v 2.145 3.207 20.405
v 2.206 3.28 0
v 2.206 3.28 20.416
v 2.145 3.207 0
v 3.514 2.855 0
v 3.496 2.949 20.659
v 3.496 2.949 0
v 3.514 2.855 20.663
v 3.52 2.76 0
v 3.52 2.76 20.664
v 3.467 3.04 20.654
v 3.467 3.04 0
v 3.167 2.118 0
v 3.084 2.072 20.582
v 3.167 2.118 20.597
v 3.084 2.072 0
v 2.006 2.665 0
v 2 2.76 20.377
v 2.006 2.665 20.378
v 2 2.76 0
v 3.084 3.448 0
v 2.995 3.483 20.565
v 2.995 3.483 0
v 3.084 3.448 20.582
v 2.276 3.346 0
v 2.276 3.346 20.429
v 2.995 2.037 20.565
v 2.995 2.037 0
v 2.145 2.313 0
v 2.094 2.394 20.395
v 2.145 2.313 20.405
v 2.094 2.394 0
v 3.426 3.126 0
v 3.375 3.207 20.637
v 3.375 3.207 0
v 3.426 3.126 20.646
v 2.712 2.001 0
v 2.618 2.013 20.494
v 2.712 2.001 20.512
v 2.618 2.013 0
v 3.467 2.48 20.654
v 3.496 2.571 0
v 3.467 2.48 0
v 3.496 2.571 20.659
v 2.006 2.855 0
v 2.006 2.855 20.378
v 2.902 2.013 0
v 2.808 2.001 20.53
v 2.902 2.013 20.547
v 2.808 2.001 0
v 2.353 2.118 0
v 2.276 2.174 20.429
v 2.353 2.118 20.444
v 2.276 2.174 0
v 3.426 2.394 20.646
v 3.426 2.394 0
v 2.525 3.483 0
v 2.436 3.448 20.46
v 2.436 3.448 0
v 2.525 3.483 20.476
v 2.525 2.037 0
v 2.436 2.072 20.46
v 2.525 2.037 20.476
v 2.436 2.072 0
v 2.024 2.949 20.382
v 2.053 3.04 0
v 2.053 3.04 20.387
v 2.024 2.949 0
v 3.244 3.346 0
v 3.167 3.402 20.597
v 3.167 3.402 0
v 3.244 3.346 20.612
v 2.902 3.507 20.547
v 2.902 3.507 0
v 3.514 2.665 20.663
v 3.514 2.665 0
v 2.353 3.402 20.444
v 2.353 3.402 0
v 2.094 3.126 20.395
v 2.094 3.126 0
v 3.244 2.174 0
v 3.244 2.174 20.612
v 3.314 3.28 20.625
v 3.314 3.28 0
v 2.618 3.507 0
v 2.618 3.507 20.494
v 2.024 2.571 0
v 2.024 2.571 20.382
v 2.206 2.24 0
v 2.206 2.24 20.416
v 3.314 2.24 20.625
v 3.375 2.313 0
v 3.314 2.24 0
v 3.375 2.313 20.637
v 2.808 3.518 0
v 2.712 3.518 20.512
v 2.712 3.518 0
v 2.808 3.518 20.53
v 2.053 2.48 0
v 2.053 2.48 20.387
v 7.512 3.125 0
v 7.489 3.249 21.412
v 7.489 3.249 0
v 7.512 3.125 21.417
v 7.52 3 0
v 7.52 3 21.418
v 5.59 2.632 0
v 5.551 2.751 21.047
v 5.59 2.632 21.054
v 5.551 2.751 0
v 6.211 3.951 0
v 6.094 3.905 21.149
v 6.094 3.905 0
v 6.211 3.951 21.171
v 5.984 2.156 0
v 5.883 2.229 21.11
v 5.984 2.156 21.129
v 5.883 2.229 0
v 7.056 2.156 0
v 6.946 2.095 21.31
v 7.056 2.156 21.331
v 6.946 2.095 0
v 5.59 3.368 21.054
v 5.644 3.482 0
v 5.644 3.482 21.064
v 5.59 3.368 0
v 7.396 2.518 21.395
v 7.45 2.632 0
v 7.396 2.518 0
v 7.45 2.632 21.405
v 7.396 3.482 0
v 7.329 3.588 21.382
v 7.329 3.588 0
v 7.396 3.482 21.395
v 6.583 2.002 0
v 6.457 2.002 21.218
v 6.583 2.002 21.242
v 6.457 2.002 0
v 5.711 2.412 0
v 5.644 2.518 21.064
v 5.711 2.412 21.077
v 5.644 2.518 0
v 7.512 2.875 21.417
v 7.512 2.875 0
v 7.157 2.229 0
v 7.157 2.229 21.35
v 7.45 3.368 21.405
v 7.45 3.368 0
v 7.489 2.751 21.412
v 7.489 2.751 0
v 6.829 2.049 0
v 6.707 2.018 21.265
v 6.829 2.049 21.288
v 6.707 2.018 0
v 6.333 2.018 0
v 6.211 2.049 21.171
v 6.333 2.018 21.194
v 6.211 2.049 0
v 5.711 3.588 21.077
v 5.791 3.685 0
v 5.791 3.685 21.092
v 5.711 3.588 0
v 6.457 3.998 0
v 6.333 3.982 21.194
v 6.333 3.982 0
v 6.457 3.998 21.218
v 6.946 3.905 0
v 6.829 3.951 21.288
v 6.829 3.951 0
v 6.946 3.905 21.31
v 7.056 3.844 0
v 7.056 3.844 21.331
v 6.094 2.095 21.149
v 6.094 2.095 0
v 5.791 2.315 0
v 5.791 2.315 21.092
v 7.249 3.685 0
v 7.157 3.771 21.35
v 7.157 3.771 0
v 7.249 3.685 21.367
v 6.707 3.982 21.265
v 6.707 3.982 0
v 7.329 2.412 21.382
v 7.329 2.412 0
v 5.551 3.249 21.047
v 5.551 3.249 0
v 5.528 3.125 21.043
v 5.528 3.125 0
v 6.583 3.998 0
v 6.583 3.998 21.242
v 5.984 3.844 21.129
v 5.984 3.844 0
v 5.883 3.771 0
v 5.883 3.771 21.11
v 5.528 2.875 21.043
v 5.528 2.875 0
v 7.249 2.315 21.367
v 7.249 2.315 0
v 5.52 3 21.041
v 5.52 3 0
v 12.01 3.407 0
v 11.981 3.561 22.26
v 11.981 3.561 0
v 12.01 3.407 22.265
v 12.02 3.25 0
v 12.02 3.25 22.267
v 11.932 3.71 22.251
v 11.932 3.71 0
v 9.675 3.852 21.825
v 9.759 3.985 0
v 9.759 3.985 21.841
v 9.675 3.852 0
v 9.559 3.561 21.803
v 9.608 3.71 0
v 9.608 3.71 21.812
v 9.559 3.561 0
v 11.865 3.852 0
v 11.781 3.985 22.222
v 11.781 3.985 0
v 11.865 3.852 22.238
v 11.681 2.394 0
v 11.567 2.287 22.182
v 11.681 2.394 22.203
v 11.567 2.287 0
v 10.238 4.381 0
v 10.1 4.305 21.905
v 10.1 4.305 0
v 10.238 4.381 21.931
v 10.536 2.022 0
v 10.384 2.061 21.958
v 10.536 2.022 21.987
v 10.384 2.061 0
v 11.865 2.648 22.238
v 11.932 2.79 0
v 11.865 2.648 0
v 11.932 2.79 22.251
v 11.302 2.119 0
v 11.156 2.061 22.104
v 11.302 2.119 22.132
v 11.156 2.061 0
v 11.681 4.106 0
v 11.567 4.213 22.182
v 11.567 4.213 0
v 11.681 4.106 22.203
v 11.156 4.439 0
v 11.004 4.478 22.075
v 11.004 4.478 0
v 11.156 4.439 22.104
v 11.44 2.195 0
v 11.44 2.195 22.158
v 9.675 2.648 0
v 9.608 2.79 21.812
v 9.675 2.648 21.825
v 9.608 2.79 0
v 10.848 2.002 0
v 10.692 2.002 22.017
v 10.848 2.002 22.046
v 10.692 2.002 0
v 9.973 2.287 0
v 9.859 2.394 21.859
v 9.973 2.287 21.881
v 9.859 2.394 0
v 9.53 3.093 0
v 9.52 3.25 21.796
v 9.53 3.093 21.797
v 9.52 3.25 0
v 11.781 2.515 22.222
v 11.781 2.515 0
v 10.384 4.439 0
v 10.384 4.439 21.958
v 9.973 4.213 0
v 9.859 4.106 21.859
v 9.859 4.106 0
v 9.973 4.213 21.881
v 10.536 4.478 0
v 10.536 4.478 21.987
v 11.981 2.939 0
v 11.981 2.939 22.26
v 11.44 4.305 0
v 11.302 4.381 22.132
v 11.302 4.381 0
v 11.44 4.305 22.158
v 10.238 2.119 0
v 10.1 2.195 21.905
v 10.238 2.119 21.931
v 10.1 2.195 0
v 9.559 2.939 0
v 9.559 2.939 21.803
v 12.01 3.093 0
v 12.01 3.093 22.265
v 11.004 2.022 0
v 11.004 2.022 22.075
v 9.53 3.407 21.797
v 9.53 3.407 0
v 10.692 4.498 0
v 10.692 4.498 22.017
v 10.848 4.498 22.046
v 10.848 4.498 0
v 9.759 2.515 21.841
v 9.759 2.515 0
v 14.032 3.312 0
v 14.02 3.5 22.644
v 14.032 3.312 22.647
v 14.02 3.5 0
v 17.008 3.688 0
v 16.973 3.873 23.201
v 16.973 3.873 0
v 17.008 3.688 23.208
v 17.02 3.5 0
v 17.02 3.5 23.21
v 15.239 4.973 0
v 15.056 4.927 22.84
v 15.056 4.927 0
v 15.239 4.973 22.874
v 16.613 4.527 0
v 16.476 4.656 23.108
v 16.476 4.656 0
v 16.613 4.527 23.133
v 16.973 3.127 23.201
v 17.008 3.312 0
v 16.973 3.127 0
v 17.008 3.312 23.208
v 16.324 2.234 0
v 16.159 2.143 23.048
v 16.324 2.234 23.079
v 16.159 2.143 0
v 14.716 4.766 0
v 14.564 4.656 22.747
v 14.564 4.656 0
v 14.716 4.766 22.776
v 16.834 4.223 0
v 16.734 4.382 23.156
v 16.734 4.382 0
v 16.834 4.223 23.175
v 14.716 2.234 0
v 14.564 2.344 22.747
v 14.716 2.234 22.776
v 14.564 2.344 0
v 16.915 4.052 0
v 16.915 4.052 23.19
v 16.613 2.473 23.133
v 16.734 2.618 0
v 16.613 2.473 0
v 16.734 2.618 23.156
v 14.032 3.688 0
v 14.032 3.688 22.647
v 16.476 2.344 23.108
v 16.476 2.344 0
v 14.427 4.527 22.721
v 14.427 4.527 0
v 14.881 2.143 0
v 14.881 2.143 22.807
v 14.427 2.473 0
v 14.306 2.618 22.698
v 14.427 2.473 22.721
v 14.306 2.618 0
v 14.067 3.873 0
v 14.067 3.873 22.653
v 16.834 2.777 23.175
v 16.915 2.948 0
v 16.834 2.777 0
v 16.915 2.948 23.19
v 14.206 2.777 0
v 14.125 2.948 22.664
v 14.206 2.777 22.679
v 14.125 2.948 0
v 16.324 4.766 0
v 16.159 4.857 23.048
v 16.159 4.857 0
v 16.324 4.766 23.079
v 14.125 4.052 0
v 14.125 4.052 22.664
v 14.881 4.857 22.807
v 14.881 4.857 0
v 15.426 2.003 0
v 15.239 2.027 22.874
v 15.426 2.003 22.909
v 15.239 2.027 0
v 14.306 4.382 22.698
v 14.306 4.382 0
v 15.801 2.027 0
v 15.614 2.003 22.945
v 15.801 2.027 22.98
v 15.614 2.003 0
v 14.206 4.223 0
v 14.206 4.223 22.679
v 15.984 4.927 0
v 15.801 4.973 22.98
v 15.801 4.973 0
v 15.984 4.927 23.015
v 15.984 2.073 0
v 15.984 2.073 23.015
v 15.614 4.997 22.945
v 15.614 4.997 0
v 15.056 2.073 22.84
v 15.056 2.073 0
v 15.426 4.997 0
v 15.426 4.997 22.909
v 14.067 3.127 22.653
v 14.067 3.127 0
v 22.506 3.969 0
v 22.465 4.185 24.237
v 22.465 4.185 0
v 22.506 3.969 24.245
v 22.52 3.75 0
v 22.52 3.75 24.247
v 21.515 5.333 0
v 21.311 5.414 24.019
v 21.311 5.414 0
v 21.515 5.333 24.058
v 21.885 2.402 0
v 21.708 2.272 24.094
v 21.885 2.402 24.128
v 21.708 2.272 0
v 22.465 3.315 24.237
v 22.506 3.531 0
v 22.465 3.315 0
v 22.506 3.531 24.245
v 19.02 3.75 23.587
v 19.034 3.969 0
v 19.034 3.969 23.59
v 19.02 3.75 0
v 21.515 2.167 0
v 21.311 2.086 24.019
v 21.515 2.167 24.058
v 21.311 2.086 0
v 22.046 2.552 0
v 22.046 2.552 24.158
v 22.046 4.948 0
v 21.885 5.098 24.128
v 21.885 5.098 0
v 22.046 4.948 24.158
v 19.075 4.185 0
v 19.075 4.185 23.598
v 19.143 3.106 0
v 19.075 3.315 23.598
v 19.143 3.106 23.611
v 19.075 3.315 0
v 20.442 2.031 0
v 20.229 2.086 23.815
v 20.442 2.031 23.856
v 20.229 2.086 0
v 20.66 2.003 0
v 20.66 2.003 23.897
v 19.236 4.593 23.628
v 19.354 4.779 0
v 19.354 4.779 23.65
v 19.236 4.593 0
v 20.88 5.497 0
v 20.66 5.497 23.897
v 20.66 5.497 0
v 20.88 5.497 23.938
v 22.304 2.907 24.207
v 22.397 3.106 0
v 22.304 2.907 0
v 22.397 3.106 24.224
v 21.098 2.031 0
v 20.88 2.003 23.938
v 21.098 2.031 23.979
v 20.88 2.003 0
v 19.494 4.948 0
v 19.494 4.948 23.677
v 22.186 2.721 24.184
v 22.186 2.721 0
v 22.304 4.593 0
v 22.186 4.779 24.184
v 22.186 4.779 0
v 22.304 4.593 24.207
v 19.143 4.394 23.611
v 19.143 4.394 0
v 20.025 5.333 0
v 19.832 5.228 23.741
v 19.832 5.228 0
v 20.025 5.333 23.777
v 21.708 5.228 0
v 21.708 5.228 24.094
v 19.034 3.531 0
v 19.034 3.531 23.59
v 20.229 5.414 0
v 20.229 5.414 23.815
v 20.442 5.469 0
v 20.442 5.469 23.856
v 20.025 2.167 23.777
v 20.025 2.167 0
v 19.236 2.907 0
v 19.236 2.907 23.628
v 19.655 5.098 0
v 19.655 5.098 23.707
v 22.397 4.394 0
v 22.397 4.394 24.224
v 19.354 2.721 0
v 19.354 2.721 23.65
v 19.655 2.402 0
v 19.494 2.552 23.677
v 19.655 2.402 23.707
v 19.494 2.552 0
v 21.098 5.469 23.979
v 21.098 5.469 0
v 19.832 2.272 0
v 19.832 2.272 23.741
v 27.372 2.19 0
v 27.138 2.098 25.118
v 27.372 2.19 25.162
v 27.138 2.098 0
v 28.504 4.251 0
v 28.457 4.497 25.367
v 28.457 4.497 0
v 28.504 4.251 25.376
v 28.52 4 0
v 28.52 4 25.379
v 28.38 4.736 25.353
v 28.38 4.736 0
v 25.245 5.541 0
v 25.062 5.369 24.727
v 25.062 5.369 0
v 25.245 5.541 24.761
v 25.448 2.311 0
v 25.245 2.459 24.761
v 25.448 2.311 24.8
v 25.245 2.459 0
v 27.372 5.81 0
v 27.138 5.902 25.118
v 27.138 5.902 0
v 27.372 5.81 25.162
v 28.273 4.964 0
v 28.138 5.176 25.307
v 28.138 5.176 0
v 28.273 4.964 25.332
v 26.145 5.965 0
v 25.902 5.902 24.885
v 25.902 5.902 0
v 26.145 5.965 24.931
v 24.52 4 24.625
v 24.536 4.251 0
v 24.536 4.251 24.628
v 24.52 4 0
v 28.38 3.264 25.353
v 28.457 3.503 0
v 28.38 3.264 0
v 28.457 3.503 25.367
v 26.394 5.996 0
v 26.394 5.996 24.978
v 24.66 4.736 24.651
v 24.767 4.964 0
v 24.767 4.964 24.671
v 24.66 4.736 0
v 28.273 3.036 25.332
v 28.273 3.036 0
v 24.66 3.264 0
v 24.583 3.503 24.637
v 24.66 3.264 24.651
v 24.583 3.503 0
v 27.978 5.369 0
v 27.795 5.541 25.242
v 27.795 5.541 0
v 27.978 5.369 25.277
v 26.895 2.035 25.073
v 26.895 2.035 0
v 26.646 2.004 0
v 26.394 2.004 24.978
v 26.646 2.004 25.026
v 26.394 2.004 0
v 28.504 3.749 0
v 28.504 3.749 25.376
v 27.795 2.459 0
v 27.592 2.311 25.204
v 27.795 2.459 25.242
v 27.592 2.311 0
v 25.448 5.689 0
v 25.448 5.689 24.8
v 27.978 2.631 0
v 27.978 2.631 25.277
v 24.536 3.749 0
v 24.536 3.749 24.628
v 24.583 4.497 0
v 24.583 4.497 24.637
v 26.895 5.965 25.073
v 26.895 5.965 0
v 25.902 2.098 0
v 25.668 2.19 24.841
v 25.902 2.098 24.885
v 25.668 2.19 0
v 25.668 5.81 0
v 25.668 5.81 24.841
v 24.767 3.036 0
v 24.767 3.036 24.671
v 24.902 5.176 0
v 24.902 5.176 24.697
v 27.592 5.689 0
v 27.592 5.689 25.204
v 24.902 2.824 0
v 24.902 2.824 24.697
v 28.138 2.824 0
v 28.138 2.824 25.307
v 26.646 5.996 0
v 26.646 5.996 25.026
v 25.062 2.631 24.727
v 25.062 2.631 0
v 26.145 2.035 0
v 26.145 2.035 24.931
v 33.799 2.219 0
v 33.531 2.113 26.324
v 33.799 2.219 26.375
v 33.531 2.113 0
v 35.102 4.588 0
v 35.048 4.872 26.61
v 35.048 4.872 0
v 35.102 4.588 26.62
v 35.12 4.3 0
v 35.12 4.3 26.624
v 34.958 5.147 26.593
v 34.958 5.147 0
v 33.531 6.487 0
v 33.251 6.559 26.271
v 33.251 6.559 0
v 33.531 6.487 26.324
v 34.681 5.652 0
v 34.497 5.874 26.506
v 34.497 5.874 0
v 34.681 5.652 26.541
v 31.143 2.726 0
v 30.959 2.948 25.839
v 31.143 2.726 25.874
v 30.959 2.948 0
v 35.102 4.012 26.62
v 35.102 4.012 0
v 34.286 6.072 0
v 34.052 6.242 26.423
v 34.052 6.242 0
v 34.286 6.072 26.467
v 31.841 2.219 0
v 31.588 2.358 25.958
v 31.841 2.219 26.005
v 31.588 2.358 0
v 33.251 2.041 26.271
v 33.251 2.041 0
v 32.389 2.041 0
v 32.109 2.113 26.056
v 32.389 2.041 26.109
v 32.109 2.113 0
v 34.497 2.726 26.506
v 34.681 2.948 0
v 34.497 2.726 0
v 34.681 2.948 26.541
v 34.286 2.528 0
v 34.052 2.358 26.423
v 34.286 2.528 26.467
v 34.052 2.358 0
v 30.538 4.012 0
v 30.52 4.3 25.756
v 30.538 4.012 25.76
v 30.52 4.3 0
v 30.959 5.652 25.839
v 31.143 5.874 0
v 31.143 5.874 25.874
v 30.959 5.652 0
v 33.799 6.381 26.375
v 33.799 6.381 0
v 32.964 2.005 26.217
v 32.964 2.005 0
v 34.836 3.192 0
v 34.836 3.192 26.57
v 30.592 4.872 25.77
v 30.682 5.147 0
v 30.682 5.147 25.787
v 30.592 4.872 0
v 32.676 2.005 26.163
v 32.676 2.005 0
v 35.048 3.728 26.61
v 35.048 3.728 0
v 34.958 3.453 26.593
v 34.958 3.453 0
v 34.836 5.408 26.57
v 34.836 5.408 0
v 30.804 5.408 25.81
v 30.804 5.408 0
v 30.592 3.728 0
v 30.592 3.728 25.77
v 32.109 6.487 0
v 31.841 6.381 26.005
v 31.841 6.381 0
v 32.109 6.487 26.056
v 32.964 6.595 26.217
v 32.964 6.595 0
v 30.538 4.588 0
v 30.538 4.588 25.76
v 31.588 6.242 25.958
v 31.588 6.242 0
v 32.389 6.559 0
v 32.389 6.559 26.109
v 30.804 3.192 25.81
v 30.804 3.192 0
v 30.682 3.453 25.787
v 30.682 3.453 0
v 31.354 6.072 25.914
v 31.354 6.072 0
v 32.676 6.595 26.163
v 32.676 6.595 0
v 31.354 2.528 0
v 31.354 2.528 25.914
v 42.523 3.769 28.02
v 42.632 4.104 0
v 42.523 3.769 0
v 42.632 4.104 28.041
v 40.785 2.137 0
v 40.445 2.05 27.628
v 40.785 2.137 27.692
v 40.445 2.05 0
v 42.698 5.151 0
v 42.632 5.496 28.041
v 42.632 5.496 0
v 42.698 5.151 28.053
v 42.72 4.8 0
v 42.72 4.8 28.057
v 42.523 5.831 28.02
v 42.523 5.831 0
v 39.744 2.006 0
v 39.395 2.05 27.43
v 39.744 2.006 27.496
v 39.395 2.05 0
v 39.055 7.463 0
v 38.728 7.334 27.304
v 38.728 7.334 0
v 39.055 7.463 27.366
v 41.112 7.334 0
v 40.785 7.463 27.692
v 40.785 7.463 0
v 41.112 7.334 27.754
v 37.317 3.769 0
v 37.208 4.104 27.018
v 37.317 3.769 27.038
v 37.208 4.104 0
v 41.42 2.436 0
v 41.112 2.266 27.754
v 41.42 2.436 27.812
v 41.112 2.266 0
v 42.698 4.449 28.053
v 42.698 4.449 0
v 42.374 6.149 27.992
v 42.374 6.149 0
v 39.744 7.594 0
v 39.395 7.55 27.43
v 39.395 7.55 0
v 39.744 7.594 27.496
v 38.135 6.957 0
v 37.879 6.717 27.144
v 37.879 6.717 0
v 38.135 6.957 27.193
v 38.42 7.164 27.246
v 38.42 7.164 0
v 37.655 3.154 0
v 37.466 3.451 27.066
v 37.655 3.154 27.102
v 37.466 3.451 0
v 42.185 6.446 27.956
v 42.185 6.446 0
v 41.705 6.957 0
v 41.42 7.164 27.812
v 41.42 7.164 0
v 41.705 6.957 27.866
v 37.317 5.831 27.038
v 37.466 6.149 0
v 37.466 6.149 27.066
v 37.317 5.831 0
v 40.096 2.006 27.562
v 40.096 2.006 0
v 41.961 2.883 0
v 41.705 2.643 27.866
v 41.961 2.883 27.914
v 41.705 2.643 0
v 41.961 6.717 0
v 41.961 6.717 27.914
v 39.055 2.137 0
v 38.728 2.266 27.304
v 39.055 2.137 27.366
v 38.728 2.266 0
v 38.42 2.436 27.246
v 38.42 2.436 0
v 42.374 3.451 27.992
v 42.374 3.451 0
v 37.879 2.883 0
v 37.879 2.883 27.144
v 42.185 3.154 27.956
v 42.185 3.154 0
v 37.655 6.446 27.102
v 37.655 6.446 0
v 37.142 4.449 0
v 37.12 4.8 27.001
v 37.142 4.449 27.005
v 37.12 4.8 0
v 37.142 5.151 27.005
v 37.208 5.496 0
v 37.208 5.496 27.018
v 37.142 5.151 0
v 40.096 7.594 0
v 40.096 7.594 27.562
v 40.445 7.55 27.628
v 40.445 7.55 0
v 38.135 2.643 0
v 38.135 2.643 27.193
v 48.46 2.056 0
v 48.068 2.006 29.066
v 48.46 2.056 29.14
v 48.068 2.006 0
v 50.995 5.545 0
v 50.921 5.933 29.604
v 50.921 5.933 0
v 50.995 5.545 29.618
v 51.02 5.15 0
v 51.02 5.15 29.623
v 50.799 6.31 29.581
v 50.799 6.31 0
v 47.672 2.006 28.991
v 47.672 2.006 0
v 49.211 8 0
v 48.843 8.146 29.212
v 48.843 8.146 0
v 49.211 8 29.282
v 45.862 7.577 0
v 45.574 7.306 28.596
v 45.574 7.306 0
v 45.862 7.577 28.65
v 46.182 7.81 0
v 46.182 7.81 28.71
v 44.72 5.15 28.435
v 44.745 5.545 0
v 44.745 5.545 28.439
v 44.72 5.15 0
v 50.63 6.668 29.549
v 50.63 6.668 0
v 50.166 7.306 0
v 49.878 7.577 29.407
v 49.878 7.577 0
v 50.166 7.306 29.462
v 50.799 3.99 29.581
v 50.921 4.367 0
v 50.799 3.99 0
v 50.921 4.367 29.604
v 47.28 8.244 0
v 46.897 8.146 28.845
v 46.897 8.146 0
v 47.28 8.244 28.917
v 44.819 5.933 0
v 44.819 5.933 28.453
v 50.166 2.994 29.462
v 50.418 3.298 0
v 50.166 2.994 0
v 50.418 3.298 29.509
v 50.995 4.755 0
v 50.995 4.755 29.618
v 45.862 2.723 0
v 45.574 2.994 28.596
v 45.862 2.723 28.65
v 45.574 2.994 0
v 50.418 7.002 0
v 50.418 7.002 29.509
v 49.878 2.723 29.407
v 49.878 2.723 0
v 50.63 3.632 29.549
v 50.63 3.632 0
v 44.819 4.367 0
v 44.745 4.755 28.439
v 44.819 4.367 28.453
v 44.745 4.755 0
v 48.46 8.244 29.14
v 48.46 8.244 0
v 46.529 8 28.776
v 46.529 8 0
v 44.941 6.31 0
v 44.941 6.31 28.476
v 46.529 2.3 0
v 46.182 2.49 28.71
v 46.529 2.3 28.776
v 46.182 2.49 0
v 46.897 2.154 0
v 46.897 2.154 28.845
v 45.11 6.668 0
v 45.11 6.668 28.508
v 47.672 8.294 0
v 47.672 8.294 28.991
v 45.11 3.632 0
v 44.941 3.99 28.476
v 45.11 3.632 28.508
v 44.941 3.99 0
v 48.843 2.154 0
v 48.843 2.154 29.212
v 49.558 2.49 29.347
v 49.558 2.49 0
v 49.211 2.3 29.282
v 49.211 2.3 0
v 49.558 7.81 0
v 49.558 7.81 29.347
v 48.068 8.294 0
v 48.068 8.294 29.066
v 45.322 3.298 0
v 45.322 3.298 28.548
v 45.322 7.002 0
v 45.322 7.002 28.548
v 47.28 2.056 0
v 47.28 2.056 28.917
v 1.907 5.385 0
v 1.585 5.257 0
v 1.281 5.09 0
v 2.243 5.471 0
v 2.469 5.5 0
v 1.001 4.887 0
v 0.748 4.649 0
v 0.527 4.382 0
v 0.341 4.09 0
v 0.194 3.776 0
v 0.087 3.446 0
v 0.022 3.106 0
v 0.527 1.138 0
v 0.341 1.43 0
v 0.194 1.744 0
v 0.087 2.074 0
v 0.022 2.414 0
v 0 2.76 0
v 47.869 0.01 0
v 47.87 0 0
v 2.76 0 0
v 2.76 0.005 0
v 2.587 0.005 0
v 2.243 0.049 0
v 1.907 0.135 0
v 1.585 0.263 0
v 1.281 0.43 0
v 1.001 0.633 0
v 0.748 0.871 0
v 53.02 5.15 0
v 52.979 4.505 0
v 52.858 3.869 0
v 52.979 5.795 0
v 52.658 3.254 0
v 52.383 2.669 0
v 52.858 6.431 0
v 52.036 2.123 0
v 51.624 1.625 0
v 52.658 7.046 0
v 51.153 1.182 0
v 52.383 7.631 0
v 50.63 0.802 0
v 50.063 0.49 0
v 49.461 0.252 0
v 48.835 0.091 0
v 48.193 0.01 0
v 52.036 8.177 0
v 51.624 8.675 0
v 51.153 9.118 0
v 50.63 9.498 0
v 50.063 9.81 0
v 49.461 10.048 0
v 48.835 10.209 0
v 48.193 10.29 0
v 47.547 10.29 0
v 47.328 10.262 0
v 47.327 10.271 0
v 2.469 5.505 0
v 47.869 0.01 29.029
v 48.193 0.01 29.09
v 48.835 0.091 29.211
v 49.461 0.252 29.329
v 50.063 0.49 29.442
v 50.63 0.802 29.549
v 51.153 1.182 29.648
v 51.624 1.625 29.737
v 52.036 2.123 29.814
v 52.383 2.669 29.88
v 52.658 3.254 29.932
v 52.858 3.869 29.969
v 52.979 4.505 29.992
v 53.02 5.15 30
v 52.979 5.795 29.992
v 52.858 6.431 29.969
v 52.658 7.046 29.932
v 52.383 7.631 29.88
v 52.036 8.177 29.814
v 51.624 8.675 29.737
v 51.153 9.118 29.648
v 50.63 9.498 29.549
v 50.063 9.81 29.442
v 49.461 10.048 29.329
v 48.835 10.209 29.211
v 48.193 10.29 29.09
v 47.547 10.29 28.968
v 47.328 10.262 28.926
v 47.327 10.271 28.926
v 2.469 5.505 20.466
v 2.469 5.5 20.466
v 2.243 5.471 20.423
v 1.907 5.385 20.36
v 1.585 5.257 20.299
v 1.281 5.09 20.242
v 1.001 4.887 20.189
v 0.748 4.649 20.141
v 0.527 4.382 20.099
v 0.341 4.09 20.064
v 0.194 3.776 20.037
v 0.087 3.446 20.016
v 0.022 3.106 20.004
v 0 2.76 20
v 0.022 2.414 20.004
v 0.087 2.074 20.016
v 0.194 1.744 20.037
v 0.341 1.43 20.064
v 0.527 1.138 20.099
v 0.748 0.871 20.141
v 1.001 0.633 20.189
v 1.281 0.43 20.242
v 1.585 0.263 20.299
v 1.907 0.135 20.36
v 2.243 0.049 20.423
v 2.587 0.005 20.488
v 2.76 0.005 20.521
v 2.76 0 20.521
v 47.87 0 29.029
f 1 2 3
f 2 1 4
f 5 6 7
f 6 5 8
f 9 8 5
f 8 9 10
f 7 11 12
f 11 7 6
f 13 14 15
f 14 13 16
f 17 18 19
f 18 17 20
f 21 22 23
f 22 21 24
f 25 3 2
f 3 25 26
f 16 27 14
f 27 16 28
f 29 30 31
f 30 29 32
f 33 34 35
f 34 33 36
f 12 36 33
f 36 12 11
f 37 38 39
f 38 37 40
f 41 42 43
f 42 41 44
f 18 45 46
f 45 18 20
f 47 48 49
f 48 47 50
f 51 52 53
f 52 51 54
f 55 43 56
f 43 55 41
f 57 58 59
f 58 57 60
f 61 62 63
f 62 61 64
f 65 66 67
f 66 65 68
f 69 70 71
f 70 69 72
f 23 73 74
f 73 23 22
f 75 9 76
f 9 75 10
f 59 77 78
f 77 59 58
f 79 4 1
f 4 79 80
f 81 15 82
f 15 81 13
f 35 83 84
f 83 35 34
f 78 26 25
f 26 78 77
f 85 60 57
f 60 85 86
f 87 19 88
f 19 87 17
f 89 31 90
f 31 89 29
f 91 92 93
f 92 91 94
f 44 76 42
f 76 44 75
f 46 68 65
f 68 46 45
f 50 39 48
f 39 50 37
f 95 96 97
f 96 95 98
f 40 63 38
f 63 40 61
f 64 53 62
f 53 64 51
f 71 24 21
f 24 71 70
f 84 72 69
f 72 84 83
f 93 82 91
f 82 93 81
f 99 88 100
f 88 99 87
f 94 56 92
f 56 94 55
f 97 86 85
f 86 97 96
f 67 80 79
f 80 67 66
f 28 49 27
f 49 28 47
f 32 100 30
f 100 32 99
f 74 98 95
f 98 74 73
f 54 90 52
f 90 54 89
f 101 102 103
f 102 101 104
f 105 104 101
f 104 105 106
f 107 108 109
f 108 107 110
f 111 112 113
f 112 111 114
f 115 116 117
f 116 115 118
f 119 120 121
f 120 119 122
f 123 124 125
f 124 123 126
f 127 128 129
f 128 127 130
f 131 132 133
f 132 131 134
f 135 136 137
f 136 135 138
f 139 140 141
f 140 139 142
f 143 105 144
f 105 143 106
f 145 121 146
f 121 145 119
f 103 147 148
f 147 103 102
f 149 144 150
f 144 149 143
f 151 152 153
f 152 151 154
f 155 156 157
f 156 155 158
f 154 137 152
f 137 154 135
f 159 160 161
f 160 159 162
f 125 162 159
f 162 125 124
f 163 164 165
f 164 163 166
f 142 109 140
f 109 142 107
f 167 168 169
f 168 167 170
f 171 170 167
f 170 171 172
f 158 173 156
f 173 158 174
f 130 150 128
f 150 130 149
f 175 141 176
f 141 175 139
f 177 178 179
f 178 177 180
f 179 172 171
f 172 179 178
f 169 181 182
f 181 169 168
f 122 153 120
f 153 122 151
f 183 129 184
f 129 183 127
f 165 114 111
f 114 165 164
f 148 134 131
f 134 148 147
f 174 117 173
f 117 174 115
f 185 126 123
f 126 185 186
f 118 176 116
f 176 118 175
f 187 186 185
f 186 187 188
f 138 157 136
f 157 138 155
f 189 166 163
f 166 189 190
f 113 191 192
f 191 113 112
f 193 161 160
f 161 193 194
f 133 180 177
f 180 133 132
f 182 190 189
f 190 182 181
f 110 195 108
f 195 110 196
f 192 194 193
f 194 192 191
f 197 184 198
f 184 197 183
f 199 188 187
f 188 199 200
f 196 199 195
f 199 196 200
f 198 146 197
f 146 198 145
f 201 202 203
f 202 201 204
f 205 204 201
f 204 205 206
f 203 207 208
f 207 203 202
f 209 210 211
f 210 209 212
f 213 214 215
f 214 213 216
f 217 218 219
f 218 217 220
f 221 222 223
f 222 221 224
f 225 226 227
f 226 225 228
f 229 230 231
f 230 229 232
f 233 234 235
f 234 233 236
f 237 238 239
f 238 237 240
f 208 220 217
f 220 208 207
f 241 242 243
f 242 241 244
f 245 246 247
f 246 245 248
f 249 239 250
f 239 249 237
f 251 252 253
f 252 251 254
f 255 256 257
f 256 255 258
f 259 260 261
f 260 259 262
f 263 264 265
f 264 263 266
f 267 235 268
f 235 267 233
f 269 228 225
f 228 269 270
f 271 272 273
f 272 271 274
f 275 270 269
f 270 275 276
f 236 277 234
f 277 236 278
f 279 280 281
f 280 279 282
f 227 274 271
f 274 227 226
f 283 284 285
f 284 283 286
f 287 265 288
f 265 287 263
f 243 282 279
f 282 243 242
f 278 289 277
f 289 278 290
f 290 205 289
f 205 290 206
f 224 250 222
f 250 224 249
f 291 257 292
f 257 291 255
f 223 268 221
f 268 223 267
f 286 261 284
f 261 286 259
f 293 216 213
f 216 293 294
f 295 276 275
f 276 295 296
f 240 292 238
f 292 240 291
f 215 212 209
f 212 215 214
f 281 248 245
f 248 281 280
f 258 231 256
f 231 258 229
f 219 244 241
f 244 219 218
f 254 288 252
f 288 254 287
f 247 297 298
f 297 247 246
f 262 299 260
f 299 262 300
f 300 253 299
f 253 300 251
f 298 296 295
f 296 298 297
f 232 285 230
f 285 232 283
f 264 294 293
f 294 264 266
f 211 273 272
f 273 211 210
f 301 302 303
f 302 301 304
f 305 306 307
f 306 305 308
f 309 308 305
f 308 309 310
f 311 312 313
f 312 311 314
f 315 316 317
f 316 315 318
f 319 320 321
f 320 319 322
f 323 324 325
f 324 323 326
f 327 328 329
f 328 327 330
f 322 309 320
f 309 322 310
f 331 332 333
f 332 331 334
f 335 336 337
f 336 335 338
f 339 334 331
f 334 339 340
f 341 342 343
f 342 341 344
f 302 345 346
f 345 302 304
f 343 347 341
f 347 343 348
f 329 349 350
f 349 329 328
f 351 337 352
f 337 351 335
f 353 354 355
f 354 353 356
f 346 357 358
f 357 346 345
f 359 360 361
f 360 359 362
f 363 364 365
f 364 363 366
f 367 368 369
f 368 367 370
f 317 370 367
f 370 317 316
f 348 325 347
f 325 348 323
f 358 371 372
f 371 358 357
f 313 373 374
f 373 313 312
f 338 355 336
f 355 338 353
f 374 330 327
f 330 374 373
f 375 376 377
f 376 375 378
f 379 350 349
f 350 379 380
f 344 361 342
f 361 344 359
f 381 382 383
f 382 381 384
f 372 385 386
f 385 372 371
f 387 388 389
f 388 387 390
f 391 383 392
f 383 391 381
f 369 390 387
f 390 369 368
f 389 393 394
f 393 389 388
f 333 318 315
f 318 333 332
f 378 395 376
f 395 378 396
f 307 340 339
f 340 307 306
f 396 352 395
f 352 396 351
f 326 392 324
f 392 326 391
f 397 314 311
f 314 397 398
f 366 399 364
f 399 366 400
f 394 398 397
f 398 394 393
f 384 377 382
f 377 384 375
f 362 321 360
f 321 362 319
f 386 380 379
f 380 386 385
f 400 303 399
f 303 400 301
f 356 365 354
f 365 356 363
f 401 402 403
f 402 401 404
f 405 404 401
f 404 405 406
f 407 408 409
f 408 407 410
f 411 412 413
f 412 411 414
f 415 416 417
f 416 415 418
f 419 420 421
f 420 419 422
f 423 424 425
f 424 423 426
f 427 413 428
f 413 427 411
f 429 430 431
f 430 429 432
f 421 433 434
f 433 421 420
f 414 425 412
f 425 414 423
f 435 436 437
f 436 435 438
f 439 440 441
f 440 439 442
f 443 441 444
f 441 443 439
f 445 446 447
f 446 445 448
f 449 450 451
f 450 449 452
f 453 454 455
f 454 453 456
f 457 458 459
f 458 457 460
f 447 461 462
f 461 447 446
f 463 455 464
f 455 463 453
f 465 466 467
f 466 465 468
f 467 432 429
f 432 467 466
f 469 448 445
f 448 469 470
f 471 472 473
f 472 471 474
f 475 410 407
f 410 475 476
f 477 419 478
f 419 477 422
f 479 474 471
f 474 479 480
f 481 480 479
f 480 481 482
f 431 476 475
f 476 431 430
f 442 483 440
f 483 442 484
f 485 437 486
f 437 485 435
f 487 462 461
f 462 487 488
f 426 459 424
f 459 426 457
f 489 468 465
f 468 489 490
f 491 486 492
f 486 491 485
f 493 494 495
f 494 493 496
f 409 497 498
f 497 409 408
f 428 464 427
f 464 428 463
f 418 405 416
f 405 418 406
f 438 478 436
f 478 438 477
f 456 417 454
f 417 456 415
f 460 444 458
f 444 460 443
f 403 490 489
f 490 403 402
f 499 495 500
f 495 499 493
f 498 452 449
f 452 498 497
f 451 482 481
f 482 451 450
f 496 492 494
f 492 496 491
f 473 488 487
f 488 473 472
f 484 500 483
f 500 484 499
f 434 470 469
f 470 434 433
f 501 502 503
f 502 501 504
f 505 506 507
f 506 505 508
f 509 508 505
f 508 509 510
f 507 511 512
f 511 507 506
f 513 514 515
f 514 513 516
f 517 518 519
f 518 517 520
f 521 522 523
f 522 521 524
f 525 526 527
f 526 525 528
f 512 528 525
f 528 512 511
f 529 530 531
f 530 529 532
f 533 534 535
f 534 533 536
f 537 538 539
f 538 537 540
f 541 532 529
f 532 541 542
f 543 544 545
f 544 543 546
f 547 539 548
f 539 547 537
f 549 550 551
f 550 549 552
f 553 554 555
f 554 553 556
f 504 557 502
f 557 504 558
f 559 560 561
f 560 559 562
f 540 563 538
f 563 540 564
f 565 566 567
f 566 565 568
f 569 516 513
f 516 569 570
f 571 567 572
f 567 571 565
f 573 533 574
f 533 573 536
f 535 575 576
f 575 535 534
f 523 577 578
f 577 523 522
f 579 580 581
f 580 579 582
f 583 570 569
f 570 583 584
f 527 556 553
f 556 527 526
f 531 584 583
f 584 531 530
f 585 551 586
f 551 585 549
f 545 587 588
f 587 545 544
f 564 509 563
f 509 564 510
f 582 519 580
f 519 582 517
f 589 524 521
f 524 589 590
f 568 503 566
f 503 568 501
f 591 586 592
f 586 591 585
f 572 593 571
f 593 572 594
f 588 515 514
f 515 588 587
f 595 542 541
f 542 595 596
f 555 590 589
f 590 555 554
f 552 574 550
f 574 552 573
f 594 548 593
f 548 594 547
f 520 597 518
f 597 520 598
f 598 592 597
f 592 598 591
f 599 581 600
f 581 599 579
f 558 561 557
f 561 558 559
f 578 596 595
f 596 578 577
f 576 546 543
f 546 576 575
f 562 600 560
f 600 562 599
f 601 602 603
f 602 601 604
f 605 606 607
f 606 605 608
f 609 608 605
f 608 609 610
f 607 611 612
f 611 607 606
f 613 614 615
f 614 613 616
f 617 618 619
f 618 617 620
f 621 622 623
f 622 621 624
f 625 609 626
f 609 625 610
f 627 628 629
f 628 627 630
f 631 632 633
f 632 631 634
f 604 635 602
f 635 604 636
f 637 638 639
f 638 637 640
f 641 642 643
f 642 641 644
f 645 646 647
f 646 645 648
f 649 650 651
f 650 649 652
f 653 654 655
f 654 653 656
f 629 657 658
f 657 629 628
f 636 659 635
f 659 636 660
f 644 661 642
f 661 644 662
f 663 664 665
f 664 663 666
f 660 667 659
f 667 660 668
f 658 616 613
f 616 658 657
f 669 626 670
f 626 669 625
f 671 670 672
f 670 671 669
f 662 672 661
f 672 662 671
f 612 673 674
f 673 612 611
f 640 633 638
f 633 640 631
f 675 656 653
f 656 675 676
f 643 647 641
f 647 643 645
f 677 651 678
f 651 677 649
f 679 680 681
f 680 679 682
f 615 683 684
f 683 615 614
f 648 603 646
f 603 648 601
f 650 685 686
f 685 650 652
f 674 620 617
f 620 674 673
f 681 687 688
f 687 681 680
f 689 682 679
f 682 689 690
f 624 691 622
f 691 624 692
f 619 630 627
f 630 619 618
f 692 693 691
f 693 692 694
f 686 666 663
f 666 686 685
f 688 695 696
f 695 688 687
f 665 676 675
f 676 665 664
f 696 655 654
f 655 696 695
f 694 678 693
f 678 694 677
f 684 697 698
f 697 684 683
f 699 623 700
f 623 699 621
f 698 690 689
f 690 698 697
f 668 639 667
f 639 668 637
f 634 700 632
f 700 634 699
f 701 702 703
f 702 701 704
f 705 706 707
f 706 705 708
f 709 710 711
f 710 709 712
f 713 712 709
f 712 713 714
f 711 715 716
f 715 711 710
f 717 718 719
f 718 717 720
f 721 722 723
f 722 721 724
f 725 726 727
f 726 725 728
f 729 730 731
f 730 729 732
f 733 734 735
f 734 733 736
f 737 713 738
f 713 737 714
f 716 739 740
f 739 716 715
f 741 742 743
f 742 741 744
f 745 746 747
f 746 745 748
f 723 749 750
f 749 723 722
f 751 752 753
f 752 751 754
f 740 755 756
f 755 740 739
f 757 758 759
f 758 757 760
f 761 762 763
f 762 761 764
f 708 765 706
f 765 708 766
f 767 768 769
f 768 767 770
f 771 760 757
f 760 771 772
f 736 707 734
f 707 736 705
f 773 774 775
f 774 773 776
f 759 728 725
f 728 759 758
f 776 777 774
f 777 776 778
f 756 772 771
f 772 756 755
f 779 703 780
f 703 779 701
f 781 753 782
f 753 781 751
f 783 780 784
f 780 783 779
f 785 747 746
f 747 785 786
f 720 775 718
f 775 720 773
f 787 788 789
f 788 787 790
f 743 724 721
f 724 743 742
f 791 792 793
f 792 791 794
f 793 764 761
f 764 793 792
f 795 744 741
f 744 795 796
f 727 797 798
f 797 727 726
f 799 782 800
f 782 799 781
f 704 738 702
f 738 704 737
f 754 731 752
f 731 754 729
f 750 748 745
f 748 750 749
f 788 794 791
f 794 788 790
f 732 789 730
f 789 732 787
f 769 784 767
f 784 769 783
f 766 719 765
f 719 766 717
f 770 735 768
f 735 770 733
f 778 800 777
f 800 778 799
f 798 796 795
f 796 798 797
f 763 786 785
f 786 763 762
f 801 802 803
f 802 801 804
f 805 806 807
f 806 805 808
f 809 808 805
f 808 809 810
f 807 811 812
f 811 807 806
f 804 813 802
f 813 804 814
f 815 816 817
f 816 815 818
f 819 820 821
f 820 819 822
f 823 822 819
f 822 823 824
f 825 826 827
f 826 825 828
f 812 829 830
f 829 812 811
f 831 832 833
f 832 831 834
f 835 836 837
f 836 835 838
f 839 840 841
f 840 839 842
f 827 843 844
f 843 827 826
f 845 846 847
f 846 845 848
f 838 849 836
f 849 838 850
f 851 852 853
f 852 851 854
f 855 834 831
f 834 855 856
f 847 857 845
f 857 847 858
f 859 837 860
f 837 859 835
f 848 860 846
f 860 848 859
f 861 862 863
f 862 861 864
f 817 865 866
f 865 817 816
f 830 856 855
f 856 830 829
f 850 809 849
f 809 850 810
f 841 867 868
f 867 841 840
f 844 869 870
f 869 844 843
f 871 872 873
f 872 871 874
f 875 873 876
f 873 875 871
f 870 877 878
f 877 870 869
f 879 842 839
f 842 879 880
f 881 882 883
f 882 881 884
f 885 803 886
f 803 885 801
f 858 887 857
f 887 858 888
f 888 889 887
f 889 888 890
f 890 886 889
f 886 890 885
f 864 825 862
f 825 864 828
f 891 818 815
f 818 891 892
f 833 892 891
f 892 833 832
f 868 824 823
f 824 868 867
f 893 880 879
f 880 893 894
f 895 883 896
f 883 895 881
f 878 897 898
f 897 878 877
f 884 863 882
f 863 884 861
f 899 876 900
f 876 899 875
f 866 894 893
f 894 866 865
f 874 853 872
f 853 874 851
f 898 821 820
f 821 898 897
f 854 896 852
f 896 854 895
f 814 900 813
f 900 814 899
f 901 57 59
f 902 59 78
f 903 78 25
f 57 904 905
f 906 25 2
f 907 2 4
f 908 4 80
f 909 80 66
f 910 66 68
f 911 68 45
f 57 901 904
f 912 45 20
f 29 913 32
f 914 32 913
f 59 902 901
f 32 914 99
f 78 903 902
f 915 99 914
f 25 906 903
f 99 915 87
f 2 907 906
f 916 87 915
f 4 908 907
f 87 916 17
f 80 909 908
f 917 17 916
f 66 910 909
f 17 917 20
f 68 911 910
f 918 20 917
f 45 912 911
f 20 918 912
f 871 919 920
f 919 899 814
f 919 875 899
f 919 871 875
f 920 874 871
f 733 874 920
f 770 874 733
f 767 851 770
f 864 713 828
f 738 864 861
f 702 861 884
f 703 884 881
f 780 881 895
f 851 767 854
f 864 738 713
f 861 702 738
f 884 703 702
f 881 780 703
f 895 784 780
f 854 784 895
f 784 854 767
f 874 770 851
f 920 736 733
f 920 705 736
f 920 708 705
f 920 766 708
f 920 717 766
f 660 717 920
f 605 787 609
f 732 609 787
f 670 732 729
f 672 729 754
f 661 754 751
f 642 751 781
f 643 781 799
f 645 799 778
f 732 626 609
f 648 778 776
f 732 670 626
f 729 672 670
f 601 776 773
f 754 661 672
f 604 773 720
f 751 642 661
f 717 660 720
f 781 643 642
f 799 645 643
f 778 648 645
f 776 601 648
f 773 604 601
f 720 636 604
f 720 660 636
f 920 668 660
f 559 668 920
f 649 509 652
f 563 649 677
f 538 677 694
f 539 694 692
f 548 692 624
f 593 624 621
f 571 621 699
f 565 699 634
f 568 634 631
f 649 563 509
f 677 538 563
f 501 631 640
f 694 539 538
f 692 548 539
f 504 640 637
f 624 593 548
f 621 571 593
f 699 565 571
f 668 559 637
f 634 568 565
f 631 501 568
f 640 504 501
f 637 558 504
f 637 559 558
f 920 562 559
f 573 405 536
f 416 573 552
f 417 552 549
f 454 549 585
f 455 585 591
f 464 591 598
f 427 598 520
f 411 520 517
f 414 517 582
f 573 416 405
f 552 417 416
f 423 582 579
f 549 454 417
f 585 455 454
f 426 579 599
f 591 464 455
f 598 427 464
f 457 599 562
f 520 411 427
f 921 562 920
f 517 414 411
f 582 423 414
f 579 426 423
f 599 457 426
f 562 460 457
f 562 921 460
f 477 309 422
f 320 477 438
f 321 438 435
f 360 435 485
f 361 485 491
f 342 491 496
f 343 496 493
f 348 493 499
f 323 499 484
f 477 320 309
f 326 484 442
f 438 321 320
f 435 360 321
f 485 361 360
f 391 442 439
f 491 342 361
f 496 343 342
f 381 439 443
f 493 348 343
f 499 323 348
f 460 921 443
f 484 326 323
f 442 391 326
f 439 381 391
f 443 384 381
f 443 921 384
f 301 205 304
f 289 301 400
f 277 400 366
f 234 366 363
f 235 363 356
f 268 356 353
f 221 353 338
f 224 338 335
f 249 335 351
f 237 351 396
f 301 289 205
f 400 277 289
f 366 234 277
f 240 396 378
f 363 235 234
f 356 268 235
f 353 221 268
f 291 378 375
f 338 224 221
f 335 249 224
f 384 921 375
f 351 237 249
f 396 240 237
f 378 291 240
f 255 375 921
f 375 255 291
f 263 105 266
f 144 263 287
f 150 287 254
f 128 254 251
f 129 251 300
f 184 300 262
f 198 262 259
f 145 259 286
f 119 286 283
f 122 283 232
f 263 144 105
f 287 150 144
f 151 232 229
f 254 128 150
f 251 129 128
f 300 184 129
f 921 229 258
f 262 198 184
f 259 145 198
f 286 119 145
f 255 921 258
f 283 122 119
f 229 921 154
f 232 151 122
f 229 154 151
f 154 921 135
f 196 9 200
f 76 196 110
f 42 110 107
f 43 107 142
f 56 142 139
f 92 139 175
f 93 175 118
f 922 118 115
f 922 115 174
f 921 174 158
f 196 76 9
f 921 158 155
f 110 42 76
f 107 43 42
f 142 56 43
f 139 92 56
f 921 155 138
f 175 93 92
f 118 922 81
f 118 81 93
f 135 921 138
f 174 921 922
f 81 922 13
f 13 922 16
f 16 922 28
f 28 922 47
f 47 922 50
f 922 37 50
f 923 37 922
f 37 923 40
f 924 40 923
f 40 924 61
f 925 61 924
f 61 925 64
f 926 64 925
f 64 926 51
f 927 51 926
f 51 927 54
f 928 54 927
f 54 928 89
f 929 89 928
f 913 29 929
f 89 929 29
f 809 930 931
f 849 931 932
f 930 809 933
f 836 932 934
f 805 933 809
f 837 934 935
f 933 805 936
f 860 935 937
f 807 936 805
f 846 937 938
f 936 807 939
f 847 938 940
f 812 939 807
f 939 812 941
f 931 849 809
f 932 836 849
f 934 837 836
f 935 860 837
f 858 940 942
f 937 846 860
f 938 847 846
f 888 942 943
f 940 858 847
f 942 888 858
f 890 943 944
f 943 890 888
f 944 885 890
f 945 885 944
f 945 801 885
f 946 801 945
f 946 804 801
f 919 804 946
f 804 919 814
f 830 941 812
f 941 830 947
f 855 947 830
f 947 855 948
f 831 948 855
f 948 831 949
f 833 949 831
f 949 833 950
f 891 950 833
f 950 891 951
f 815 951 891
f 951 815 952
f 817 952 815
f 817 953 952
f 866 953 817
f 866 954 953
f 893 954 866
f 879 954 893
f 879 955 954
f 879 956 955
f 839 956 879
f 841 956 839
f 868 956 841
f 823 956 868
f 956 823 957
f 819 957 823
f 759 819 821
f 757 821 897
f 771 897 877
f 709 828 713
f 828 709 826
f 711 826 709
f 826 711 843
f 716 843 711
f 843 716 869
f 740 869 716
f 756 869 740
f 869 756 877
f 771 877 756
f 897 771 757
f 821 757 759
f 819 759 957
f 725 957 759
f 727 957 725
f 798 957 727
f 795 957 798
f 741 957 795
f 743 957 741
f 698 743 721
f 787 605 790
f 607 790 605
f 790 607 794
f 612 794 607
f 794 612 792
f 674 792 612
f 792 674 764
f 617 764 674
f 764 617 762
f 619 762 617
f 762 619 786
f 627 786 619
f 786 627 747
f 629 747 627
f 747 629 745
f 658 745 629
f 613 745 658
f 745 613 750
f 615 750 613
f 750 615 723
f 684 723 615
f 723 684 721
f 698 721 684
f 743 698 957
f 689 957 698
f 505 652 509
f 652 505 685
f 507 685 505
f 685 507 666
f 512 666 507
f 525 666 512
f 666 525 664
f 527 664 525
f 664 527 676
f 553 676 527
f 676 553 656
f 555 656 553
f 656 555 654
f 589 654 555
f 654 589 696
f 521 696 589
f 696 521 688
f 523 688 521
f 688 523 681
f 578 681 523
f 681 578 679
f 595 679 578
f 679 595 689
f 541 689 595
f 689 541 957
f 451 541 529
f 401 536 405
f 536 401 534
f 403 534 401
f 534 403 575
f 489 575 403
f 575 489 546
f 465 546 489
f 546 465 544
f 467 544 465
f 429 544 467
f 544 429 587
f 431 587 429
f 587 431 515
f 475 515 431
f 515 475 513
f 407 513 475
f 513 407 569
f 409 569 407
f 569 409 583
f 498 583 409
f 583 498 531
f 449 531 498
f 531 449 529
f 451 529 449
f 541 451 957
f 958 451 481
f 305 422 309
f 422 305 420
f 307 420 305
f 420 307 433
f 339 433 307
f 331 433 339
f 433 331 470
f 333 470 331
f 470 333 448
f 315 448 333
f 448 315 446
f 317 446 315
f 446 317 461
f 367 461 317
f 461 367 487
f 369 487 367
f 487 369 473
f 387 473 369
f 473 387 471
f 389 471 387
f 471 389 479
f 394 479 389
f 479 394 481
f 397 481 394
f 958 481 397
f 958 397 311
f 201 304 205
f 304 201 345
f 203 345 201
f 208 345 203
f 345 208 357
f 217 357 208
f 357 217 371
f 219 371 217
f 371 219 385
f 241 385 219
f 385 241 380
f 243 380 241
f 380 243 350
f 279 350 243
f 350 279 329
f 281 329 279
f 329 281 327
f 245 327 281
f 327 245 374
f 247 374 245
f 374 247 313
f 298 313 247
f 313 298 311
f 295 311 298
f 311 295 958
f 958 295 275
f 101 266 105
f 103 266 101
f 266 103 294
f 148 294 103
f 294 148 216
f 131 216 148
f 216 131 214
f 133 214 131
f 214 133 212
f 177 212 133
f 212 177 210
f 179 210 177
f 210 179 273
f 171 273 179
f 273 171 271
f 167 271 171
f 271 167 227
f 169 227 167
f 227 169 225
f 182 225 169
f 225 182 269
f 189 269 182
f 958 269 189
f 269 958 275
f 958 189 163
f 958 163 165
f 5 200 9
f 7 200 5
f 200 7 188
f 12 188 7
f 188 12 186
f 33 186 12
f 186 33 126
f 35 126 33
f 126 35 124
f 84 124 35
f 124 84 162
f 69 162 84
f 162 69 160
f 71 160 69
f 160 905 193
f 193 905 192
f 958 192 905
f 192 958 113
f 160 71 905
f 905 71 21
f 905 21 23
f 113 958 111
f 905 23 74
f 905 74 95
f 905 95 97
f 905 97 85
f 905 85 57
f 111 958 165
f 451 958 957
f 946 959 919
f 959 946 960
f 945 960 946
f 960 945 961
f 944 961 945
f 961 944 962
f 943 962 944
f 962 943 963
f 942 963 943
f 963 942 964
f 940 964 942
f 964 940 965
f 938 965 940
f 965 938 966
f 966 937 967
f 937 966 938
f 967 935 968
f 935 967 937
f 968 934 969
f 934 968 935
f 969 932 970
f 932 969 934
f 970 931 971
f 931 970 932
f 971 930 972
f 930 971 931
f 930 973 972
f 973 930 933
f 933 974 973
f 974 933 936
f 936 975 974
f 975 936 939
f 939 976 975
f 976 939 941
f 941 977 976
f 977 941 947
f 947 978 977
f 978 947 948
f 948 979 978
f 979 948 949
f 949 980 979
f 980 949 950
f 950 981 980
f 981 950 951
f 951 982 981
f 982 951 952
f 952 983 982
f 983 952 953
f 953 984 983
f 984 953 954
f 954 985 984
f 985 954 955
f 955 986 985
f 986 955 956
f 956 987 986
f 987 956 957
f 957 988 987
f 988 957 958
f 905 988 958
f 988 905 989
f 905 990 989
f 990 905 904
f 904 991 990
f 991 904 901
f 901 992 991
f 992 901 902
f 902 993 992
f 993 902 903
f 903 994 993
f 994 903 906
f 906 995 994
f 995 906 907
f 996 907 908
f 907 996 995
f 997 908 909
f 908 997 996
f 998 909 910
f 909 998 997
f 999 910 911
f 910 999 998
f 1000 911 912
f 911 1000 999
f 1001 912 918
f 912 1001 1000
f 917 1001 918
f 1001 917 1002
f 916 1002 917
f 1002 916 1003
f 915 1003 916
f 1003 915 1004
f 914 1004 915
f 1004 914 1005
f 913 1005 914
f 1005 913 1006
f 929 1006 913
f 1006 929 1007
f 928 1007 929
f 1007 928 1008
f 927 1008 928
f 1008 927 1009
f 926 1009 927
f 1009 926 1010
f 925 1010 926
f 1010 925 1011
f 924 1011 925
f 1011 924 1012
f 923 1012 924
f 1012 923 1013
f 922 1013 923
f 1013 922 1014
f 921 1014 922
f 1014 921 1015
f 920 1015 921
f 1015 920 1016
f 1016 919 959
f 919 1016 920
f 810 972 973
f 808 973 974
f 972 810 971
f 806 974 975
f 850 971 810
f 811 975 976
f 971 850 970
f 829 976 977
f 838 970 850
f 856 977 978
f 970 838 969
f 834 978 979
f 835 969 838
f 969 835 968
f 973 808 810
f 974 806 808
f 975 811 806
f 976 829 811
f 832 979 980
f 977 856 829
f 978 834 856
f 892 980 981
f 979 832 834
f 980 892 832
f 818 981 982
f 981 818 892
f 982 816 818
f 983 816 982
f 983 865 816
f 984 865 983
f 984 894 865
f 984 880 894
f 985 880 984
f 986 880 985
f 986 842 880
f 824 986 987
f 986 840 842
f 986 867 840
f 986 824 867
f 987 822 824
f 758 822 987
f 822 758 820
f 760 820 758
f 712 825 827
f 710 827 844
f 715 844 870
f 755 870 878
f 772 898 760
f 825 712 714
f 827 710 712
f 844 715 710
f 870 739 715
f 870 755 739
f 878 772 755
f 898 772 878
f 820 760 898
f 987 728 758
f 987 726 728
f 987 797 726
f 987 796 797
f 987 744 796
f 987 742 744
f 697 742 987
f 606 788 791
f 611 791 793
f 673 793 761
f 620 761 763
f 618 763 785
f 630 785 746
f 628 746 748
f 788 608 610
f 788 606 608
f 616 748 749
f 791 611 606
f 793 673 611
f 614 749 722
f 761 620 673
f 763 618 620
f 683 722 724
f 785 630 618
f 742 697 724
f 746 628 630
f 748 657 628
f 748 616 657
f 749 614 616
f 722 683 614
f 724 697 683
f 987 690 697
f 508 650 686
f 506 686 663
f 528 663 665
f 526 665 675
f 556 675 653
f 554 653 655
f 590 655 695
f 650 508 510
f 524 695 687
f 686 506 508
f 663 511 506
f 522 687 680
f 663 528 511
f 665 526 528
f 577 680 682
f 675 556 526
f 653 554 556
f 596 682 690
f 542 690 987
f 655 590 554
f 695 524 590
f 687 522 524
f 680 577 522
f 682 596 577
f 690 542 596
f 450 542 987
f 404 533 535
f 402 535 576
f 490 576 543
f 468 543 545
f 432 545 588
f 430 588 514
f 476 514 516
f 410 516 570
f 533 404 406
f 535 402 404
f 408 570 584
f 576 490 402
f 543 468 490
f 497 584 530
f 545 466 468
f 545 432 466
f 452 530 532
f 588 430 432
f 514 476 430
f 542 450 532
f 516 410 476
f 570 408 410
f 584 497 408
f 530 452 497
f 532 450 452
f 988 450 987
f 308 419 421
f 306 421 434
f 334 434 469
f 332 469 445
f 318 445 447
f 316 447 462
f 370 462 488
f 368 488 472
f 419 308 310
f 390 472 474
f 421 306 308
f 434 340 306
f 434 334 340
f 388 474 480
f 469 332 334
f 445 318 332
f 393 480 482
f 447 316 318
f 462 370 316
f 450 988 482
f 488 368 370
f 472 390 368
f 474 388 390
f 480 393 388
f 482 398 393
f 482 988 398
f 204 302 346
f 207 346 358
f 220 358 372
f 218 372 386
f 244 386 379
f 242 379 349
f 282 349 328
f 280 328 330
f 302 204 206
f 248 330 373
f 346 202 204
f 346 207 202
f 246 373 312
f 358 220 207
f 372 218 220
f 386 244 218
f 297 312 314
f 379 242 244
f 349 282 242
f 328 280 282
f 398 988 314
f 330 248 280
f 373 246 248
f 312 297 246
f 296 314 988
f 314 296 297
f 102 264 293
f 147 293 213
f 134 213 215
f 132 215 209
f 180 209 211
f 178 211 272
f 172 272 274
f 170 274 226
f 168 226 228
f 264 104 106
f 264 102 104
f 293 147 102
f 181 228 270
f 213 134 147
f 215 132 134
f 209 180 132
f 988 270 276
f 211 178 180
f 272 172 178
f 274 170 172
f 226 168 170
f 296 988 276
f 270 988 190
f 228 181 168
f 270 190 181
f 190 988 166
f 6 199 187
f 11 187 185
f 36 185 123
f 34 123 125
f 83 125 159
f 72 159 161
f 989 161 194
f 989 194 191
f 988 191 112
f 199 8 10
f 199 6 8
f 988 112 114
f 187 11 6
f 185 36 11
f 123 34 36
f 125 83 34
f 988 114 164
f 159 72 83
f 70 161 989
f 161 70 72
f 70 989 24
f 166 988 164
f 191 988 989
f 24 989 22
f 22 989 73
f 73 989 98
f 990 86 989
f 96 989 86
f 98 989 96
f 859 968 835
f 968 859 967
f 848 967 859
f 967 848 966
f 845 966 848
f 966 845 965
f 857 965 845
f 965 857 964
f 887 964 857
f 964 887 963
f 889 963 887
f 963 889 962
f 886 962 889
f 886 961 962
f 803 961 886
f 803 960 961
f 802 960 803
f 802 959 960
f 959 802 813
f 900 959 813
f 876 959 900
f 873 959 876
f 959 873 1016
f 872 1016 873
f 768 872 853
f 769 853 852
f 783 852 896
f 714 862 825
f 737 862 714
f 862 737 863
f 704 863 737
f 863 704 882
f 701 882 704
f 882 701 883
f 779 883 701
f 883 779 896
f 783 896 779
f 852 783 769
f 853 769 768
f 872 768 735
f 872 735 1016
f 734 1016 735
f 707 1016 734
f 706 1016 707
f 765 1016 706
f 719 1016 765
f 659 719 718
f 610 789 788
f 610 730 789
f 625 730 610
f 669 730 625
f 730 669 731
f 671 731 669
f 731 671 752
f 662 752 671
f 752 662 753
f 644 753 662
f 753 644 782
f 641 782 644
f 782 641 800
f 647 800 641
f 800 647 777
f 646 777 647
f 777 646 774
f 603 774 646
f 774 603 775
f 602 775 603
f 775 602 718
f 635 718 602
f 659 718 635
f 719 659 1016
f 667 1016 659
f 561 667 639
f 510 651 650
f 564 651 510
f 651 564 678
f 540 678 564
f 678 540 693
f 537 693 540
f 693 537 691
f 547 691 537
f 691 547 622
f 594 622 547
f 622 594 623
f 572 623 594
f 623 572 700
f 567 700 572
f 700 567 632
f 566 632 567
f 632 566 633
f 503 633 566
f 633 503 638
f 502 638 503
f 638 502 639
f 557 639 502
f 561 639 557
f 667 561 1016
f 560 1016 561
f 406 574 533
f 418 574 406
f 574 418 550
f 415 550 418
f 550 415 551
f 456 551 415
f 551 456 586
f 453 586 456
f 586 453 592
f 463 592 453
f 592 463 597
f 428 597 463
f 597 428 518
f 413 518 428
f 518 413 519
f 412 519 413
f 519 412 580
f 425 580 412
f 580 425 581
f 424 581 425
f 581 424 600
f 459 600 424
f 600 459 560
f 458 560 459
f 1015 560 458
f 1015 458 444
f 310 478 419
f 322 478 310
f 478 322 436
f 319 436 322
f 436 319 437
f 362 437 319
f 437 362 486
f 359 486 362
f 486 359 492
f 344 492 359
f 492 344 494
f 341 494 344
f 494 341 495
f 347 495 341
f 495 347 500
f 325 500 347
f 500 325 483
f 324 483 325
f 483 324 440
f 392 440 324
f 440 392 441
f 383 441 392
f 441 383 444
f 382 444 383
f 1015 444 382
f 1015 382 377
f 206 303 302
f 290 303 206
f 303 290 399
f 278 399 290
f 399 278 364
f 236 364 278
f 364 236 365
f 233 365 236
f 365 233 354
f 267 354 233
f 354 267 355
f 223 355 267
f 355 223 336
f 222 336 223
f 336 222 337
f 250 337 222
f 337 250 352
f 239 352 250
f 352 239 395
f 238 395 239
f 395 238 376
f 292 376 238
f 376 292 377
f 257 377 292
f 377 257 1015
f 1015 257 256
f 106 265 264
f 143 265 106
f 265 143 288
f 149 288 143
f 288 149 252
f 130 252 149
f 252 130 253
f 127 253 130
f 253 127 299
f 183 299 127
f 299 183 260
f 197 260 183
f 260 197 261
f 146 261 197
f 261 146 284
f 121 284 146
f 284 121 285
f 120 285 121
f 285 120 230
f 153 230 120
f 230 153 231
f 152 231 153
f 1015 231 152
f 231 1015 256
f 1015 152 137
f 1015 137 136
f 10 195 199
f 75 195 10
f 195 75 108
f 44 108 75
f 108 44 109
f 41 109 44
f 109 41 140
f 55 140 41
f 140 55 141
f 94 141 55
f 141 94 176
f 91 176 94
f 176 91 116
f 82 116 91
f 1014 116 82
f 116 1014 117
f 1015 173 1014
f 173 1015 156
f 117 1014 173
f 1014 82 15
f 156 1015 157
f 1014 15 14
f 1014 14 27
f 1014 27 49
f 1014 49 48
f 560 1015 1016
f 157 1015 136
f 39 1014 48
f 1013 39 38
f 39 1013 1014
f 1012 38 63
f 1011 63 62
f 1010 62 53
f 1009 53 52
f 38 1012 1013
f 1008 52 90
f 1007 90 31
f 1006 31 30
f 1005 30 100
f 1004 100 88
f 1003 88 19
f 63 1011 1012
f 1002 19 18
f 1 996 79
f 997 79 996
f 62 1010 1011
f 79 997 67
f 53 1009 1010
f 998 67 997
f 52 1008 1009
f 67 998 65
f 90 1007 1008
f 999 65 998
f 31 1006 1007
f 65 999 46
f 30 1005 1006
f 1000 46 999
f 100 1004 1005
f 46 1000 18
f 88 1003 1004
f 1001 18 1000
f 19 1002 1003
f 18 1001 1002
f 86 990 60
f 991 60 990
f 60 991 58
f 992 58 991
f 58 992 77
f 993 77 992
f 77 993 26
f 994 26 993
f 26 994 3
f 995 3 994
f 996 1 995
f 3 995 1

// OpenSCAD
// Parameters

input_diameters = [1.27,1.5,2,2.5,3,3.5,4,5,5.5];
spacing = 2;

start_height = 20;
final_height = 30;

// Useful functions
function sumv(v,i,s=0) = (i==s ? v[i] : v[i] + sumv(v,i-1,s));
function enlarge(diam) = (diam >= 5.5 ? diam + 0.8 : diam >= 4 ? diam + 0.6 : diam >= 1.5 ? diam + 0.5 : diam + 0.25 );
function act_circle(diam) = diam / cos(30);

// Calculations
$fn=50;

allen_diameters = [for (d = input_diameters) enlarge(d)];
test_diameters = [for (d = input_diameters) act_circle(d)];

echo( input_diameters);
echo( allen_diameters);
echo( test_diameters);

final_width = max(allen_diameters) + 2 * spacing;
initial_width = min(allen_diameters) + 2 * spacing;

total_spacing = spacing * (len(allen_diameters) + 1);

total_length = total_spacing
    + sumv(allen_diameters, len(allen_diameters)-1);

// Modules

module body() {
// create body
linear_extrude(height = final_height)
union() {
  y_diff = final_width - initial_width;
  x_diff = total_length - (final_width + initial_width) / 2;
  theta = atan2(y_diff, x_diff);

  unit_tan_x = cos(theta + 90);
  unit_tan_y = sin(theta + 90);

  init_circ_x = initial_width / 2;
  init_circ_y = initial_width / 2;

  final_circ_x = total_length - final_width / 2;
  final_circ_y = final_width / 2;

  tan_x_1 = unit_tan_x * initial_width / 2 + init_circ_x;
  tan_y_1 = unit_tan_y * initial_width / 2 + init_circ_y;

  tan_x_2 = unit_tan_x * final_width / 2 + final_circ_x;
  tan_y_2 = unit_tan_y * final_width / 2 + final_circ_y;

  // Cubic Part
  polygon([[init_circ_x, 0], // bottom left
          [final_circ_x, 0], //bottom right
          [tan_x_2, tan_y_2], // top right
          [tan_x_1, tan_y_1]]);

  // First Rounded
  translate([init_circ_x, init_circ_y, 0])
  circle(d=initial_width);

  // Larger Rounded
  translate([final_circ_x, final_circ_y, 0])
  circle(d=final_width);
}
}

module holes() {
for (i = [0:len(allen_diameters)]) {
    // translate hole to proper location
    hole_x = sumv(allen_diameters,i) + spacing*(i+1) - allen_diameters[i]/2;
    hole_y = spacing + allen_diameters[i]/2;
    translate([hole_x, hole_y, -0.5])
    // create hole
    cylinder(final_height + 1, d=allen_diameters[i]);
}
}

module top_slant() {
    translate([0,0,start_height])
    rotate([0, -atan2(final_height - start_height, total_length),0])
    translate([-0.5,-0.5,0])
    cube([total_length * 2, final_width + 1, final_height]);
}

// Final

difference() {
body();
holes();
top_slant();
}
